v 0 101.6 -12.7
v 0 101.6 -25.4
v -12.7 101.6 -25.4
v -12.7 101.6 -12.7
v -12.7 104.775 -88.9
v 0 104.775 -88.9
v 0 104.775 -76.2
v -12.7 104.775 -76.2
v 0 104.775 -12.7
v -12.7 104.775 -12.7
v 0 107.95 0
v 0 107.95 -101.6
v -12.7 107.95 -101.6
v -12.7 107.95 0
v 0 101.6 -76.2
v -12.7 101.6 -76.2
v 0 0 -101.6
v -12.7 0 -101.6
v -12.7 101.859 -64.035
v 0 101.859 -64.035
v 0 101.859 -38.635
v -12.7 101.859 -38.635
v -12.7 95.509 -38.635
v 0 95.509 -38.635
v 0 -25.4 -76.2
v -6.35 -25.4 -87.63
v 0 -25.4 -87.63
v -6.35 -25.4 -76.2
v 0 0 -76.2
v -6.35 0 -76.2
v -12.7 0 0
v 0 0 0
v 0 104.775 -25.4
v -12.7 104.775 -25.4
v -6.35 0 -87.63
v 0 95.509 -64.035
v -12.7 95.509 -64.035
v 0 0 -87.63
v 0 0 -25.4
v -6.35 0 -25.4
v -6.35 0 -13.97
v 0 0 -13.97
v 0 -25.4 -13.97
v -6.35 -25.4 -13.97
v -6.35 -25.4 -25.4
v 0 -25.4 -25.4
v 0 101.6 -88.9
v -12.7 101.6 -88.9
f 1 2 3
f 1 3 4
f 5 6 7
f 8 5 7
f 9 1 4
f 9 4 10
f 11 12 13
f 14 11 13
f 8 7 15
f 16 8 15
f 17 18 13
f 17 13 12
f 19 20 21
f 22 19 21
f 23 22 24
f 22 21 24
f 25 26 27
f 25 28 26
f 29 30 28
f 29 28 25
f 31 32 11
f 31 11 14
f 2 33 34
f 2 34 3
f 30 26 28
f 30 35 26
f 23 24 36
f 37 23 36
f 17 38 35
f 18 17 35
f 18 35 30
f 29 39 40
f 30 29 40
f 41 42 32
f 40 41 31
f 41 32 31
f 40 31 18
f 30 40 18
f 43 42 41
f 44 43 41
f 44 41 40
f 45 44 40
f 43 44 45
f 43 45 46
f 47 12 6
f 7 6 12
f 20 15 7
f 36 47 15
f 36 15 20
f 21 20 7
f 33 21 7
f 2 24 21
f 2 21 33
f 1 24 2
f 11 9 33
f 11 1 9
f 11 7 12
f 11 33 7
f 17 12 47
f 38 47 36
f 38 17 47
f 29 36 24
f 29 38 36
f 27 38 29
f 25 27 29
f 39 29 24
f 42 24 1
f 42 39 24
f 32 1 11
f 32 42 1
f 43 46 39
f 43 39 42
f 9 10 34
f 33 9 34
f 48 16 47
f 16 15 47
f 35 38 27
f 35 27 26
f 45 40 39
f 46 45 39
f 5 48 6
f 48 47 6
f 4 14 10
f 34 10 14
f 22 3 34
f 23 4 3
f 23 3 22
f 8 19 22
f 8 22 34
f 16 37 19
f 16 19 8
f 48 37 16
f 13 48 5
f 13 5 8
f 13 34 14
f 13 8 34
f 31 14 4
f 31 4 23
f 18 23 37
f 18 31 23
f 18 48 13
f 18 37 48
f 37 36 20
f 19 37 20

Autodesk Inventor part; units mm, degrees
ref_plane "YZ Plane" through (0, 0, 0) normal (1, 0, 0) x (0, 1, 0)
ref_plane "XZ Plane" through (0, 0, 0) normal (0, 1, 0) x (-1, 0, 0)
ref_plane "XY Plane" through (0, 0, 0) normal (0, 0, 1) x (1, 0, 0)
sketch "Sketch1" plane through (0, 0, 0) normal (0, 1, 0) x (-1, 0, 0)
  line L0 (0, 0) -> (12.7, 0)
  line L1 (12.7, 0) -> (12.7, -101.6)
  line L2 (12.7, -101.6) -> (0, -101.6)
  line L3 (0, -101.6) -> (0, 0)
  dimension "d1" = 12.7
  dimension "d2" = 101.6
extrude "Extrusion1" add sketch "Sketch1" along normal blind 107.95
sketch "Sketch2" plane through (0, 0, 0) normal (0, -1, 0) x (1, 0, 0)
  line L0 (0, 0) -> (0, -101.6) projected
  line L1 (0, -101.6) -> (0, -87.63)
  line L2 (0, 0) -> (0, -13.97)
  line L3 (0, -13.97) -> (-6.35, -13.97)
  line L4 (-6.35, -13.97) -> (-6.35, -25.4)
  line L5 (-6.35, -25.4) -> (0, -25.4)
  line L6 (0, -25.4) -> (0, -13.97)
  line L7 (0, -87.63) -> (-6.35, -87.63)
  line L8 (-6.35, -87.63) -> (-6.35, -76.2)
  line L9 (-6.35, -76.2) -> (0, -76.2)
  line L10 (0, -76.2) -> (0, -87.63)
  dimension "d6" = 13.97
  dimension "d9" = 13.97
  dimension "d10" = 6.35
  dimension "d11" = 11.43
  dimension "d12" = 6.35
  dimension "d13" = 11.43
extrude "Extrusion2" add sketch "Sketch2" along normal blind 25.4
sketch "Sketch3" plane through (0, 0, -101.6) normal (1, 0, 0) x (0, 0, -1)
  line L0 (-101.6, 0) -> (-101.6, 107.95) projected
  line L1 (-101.6, 107.95) -> (-76.2, 107.95)
  line L2 (0, 107.95) -> (-101.6, 107.95) projected
  line L3 (-76.2, 107.95) -> (-76.2, 101.6)
  line L4 (-76.2, 101.6) -> (-88.9, 101.6)
  line L5 (-88.9, 101.6) -> (-88.9, 104.775)
  line L6 (-88.9, 104.775) -> (-76.2, 104.775)
  line L7 (-76.2, 104.775) -> (-76.2, 101.6)
  line L8 (0, 107.95) -> (-25.4, 107.95)
  line L9 (-25.4, 107.95) -> (-25.4, 101.6)
  line L10 (-25.4, 101.6) -> (-12.7, 101.6)
  line L11 (-12.7, 101.6) -> (-12.7, 104.775)
  line L12 (-12.7, 104.775) -> (-25.4, 104.775)
  line L13 (-25.4, 104.775) -> (-25.4, 101.6)
  dimension "d17" = 25.4
  dimension "d18" = 6.35
  dimension "d19" = 12.7
  dimension "d20" = 3.175
  dimension "d21" = 25.4
  dimension "d22" = 6.35
  dimension "d23" = 12.7
  dimension "d24" = 3.175
extrude "Extrusion3" cut sketch "Sketch3" against normal blind 12.7
sketch "Sketch4" plane through (0, 0, -101.6) normal (1, 0, 0) x (0, 0, -1)
  line L0 (-75.6651, 101.8589) -> (-75.6651, 95.5089)
  line L1 (-75.6651, 95.5089) -> (-62.9651, 95.5089)
  line L2 (-62.9651, 95.5089) -> (-37.5651, 95.5089)
  line L3 (-37.5651, 95.5089) -> (-37.5651, 101.8589)
  line L4 (-37.5651, 101.8589) -> (-62.9651, 101.8589)
  line L5 (-62.9651, 101.8589) -> (-62.9651, 95.5089)
  point P0 (-101.6, 0)
  dimension "d29" = 6.35
  dimension "d30" = 12.7
  dimension "d31" = 25.4
  dimension "d32" = 6.35
extrude "Extrusion4" cut sketch "Sketch4" against normal blind 12.7
properties part number "back" material "LCP Plastic"
